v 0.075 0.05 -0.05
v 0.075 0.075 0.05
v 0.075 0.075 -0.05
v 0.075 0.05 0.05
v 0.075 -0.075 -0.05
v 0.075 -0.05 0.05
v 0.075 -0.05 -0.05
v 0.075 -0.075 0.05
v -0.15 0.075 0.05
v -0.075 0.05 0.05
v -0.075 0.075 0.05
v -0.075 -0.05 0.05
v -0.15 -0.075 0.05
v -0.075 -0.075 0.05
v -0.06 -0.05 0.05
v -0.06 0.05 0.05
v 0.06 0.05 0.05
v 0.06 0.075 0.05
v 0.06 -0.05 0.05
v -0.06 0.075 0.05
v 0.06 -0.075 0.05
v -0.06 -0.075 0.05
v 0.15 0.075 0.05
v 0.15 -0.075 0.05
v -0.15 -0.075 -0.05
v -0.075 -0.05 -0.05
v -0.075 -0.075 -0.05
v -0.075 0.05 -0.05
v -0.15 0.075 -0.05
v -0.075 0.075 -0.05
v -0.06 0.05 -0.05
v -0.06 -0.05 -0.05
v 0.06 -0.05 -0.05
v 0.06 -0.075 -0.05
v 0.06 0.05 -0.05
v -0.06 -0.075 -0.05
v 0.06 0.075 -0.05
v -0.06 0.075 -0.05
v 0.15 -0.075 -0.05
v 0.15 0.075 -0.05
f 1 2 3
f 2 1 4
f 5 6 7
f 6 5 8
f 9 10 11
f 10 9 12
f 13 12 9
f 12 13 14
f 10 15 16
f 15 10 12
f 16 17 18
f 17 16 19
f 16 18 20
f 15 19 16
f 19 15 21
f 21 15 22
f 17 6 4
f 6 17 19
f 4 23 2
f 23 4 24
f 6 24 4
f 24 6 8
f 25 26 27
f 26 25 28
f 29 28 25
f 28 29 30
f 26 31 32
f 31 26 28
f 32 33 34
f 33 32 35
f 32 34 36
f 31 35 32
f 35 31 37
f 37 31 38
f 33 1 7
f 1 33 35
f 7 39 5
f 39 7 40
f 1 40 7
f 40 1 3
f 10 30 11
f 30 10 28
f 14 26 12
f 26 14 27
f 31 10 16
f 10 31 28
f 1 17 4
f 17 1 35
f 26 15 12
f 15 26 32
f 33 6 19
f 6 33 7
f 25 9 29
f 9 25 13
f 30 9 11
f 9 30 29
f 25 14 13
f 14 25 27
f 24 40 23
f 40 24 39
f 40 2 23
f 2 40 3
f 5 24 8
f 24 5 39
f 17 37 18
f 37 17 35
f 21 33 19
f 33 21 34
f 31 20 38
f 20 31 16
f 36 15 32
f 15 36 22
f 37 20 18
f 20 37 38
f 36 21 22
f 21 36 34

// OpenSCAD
module stepped_bar() {
    // Dimensions
    central_length = 0.15;
    end_length = 0.075;
    total_length = central_length + 2 * end_length;
    central_width = 0.1;
    end_width = 0.15;
    height = 0.1;
    mid_thickness = 0.12;

    // Central rectangular prism
    translate([-central_length/2, -central_width/2, -height/2])
        cube([central_length, central_width, height]);

    // End blocks
    translate([-total_length/2, -end_width/2, -height/2])
        cube([end_length, end_width, height]);
    translate([central_length/2, -end_width/2, -height/2])
        cube([end_length, end_width, height]);

    // Mid-body section
    translate([-mid_thickness/2, -end_width/2, -height/2])
        cube([mid_thickness, end_width, height]);
}

stepped_bar();
